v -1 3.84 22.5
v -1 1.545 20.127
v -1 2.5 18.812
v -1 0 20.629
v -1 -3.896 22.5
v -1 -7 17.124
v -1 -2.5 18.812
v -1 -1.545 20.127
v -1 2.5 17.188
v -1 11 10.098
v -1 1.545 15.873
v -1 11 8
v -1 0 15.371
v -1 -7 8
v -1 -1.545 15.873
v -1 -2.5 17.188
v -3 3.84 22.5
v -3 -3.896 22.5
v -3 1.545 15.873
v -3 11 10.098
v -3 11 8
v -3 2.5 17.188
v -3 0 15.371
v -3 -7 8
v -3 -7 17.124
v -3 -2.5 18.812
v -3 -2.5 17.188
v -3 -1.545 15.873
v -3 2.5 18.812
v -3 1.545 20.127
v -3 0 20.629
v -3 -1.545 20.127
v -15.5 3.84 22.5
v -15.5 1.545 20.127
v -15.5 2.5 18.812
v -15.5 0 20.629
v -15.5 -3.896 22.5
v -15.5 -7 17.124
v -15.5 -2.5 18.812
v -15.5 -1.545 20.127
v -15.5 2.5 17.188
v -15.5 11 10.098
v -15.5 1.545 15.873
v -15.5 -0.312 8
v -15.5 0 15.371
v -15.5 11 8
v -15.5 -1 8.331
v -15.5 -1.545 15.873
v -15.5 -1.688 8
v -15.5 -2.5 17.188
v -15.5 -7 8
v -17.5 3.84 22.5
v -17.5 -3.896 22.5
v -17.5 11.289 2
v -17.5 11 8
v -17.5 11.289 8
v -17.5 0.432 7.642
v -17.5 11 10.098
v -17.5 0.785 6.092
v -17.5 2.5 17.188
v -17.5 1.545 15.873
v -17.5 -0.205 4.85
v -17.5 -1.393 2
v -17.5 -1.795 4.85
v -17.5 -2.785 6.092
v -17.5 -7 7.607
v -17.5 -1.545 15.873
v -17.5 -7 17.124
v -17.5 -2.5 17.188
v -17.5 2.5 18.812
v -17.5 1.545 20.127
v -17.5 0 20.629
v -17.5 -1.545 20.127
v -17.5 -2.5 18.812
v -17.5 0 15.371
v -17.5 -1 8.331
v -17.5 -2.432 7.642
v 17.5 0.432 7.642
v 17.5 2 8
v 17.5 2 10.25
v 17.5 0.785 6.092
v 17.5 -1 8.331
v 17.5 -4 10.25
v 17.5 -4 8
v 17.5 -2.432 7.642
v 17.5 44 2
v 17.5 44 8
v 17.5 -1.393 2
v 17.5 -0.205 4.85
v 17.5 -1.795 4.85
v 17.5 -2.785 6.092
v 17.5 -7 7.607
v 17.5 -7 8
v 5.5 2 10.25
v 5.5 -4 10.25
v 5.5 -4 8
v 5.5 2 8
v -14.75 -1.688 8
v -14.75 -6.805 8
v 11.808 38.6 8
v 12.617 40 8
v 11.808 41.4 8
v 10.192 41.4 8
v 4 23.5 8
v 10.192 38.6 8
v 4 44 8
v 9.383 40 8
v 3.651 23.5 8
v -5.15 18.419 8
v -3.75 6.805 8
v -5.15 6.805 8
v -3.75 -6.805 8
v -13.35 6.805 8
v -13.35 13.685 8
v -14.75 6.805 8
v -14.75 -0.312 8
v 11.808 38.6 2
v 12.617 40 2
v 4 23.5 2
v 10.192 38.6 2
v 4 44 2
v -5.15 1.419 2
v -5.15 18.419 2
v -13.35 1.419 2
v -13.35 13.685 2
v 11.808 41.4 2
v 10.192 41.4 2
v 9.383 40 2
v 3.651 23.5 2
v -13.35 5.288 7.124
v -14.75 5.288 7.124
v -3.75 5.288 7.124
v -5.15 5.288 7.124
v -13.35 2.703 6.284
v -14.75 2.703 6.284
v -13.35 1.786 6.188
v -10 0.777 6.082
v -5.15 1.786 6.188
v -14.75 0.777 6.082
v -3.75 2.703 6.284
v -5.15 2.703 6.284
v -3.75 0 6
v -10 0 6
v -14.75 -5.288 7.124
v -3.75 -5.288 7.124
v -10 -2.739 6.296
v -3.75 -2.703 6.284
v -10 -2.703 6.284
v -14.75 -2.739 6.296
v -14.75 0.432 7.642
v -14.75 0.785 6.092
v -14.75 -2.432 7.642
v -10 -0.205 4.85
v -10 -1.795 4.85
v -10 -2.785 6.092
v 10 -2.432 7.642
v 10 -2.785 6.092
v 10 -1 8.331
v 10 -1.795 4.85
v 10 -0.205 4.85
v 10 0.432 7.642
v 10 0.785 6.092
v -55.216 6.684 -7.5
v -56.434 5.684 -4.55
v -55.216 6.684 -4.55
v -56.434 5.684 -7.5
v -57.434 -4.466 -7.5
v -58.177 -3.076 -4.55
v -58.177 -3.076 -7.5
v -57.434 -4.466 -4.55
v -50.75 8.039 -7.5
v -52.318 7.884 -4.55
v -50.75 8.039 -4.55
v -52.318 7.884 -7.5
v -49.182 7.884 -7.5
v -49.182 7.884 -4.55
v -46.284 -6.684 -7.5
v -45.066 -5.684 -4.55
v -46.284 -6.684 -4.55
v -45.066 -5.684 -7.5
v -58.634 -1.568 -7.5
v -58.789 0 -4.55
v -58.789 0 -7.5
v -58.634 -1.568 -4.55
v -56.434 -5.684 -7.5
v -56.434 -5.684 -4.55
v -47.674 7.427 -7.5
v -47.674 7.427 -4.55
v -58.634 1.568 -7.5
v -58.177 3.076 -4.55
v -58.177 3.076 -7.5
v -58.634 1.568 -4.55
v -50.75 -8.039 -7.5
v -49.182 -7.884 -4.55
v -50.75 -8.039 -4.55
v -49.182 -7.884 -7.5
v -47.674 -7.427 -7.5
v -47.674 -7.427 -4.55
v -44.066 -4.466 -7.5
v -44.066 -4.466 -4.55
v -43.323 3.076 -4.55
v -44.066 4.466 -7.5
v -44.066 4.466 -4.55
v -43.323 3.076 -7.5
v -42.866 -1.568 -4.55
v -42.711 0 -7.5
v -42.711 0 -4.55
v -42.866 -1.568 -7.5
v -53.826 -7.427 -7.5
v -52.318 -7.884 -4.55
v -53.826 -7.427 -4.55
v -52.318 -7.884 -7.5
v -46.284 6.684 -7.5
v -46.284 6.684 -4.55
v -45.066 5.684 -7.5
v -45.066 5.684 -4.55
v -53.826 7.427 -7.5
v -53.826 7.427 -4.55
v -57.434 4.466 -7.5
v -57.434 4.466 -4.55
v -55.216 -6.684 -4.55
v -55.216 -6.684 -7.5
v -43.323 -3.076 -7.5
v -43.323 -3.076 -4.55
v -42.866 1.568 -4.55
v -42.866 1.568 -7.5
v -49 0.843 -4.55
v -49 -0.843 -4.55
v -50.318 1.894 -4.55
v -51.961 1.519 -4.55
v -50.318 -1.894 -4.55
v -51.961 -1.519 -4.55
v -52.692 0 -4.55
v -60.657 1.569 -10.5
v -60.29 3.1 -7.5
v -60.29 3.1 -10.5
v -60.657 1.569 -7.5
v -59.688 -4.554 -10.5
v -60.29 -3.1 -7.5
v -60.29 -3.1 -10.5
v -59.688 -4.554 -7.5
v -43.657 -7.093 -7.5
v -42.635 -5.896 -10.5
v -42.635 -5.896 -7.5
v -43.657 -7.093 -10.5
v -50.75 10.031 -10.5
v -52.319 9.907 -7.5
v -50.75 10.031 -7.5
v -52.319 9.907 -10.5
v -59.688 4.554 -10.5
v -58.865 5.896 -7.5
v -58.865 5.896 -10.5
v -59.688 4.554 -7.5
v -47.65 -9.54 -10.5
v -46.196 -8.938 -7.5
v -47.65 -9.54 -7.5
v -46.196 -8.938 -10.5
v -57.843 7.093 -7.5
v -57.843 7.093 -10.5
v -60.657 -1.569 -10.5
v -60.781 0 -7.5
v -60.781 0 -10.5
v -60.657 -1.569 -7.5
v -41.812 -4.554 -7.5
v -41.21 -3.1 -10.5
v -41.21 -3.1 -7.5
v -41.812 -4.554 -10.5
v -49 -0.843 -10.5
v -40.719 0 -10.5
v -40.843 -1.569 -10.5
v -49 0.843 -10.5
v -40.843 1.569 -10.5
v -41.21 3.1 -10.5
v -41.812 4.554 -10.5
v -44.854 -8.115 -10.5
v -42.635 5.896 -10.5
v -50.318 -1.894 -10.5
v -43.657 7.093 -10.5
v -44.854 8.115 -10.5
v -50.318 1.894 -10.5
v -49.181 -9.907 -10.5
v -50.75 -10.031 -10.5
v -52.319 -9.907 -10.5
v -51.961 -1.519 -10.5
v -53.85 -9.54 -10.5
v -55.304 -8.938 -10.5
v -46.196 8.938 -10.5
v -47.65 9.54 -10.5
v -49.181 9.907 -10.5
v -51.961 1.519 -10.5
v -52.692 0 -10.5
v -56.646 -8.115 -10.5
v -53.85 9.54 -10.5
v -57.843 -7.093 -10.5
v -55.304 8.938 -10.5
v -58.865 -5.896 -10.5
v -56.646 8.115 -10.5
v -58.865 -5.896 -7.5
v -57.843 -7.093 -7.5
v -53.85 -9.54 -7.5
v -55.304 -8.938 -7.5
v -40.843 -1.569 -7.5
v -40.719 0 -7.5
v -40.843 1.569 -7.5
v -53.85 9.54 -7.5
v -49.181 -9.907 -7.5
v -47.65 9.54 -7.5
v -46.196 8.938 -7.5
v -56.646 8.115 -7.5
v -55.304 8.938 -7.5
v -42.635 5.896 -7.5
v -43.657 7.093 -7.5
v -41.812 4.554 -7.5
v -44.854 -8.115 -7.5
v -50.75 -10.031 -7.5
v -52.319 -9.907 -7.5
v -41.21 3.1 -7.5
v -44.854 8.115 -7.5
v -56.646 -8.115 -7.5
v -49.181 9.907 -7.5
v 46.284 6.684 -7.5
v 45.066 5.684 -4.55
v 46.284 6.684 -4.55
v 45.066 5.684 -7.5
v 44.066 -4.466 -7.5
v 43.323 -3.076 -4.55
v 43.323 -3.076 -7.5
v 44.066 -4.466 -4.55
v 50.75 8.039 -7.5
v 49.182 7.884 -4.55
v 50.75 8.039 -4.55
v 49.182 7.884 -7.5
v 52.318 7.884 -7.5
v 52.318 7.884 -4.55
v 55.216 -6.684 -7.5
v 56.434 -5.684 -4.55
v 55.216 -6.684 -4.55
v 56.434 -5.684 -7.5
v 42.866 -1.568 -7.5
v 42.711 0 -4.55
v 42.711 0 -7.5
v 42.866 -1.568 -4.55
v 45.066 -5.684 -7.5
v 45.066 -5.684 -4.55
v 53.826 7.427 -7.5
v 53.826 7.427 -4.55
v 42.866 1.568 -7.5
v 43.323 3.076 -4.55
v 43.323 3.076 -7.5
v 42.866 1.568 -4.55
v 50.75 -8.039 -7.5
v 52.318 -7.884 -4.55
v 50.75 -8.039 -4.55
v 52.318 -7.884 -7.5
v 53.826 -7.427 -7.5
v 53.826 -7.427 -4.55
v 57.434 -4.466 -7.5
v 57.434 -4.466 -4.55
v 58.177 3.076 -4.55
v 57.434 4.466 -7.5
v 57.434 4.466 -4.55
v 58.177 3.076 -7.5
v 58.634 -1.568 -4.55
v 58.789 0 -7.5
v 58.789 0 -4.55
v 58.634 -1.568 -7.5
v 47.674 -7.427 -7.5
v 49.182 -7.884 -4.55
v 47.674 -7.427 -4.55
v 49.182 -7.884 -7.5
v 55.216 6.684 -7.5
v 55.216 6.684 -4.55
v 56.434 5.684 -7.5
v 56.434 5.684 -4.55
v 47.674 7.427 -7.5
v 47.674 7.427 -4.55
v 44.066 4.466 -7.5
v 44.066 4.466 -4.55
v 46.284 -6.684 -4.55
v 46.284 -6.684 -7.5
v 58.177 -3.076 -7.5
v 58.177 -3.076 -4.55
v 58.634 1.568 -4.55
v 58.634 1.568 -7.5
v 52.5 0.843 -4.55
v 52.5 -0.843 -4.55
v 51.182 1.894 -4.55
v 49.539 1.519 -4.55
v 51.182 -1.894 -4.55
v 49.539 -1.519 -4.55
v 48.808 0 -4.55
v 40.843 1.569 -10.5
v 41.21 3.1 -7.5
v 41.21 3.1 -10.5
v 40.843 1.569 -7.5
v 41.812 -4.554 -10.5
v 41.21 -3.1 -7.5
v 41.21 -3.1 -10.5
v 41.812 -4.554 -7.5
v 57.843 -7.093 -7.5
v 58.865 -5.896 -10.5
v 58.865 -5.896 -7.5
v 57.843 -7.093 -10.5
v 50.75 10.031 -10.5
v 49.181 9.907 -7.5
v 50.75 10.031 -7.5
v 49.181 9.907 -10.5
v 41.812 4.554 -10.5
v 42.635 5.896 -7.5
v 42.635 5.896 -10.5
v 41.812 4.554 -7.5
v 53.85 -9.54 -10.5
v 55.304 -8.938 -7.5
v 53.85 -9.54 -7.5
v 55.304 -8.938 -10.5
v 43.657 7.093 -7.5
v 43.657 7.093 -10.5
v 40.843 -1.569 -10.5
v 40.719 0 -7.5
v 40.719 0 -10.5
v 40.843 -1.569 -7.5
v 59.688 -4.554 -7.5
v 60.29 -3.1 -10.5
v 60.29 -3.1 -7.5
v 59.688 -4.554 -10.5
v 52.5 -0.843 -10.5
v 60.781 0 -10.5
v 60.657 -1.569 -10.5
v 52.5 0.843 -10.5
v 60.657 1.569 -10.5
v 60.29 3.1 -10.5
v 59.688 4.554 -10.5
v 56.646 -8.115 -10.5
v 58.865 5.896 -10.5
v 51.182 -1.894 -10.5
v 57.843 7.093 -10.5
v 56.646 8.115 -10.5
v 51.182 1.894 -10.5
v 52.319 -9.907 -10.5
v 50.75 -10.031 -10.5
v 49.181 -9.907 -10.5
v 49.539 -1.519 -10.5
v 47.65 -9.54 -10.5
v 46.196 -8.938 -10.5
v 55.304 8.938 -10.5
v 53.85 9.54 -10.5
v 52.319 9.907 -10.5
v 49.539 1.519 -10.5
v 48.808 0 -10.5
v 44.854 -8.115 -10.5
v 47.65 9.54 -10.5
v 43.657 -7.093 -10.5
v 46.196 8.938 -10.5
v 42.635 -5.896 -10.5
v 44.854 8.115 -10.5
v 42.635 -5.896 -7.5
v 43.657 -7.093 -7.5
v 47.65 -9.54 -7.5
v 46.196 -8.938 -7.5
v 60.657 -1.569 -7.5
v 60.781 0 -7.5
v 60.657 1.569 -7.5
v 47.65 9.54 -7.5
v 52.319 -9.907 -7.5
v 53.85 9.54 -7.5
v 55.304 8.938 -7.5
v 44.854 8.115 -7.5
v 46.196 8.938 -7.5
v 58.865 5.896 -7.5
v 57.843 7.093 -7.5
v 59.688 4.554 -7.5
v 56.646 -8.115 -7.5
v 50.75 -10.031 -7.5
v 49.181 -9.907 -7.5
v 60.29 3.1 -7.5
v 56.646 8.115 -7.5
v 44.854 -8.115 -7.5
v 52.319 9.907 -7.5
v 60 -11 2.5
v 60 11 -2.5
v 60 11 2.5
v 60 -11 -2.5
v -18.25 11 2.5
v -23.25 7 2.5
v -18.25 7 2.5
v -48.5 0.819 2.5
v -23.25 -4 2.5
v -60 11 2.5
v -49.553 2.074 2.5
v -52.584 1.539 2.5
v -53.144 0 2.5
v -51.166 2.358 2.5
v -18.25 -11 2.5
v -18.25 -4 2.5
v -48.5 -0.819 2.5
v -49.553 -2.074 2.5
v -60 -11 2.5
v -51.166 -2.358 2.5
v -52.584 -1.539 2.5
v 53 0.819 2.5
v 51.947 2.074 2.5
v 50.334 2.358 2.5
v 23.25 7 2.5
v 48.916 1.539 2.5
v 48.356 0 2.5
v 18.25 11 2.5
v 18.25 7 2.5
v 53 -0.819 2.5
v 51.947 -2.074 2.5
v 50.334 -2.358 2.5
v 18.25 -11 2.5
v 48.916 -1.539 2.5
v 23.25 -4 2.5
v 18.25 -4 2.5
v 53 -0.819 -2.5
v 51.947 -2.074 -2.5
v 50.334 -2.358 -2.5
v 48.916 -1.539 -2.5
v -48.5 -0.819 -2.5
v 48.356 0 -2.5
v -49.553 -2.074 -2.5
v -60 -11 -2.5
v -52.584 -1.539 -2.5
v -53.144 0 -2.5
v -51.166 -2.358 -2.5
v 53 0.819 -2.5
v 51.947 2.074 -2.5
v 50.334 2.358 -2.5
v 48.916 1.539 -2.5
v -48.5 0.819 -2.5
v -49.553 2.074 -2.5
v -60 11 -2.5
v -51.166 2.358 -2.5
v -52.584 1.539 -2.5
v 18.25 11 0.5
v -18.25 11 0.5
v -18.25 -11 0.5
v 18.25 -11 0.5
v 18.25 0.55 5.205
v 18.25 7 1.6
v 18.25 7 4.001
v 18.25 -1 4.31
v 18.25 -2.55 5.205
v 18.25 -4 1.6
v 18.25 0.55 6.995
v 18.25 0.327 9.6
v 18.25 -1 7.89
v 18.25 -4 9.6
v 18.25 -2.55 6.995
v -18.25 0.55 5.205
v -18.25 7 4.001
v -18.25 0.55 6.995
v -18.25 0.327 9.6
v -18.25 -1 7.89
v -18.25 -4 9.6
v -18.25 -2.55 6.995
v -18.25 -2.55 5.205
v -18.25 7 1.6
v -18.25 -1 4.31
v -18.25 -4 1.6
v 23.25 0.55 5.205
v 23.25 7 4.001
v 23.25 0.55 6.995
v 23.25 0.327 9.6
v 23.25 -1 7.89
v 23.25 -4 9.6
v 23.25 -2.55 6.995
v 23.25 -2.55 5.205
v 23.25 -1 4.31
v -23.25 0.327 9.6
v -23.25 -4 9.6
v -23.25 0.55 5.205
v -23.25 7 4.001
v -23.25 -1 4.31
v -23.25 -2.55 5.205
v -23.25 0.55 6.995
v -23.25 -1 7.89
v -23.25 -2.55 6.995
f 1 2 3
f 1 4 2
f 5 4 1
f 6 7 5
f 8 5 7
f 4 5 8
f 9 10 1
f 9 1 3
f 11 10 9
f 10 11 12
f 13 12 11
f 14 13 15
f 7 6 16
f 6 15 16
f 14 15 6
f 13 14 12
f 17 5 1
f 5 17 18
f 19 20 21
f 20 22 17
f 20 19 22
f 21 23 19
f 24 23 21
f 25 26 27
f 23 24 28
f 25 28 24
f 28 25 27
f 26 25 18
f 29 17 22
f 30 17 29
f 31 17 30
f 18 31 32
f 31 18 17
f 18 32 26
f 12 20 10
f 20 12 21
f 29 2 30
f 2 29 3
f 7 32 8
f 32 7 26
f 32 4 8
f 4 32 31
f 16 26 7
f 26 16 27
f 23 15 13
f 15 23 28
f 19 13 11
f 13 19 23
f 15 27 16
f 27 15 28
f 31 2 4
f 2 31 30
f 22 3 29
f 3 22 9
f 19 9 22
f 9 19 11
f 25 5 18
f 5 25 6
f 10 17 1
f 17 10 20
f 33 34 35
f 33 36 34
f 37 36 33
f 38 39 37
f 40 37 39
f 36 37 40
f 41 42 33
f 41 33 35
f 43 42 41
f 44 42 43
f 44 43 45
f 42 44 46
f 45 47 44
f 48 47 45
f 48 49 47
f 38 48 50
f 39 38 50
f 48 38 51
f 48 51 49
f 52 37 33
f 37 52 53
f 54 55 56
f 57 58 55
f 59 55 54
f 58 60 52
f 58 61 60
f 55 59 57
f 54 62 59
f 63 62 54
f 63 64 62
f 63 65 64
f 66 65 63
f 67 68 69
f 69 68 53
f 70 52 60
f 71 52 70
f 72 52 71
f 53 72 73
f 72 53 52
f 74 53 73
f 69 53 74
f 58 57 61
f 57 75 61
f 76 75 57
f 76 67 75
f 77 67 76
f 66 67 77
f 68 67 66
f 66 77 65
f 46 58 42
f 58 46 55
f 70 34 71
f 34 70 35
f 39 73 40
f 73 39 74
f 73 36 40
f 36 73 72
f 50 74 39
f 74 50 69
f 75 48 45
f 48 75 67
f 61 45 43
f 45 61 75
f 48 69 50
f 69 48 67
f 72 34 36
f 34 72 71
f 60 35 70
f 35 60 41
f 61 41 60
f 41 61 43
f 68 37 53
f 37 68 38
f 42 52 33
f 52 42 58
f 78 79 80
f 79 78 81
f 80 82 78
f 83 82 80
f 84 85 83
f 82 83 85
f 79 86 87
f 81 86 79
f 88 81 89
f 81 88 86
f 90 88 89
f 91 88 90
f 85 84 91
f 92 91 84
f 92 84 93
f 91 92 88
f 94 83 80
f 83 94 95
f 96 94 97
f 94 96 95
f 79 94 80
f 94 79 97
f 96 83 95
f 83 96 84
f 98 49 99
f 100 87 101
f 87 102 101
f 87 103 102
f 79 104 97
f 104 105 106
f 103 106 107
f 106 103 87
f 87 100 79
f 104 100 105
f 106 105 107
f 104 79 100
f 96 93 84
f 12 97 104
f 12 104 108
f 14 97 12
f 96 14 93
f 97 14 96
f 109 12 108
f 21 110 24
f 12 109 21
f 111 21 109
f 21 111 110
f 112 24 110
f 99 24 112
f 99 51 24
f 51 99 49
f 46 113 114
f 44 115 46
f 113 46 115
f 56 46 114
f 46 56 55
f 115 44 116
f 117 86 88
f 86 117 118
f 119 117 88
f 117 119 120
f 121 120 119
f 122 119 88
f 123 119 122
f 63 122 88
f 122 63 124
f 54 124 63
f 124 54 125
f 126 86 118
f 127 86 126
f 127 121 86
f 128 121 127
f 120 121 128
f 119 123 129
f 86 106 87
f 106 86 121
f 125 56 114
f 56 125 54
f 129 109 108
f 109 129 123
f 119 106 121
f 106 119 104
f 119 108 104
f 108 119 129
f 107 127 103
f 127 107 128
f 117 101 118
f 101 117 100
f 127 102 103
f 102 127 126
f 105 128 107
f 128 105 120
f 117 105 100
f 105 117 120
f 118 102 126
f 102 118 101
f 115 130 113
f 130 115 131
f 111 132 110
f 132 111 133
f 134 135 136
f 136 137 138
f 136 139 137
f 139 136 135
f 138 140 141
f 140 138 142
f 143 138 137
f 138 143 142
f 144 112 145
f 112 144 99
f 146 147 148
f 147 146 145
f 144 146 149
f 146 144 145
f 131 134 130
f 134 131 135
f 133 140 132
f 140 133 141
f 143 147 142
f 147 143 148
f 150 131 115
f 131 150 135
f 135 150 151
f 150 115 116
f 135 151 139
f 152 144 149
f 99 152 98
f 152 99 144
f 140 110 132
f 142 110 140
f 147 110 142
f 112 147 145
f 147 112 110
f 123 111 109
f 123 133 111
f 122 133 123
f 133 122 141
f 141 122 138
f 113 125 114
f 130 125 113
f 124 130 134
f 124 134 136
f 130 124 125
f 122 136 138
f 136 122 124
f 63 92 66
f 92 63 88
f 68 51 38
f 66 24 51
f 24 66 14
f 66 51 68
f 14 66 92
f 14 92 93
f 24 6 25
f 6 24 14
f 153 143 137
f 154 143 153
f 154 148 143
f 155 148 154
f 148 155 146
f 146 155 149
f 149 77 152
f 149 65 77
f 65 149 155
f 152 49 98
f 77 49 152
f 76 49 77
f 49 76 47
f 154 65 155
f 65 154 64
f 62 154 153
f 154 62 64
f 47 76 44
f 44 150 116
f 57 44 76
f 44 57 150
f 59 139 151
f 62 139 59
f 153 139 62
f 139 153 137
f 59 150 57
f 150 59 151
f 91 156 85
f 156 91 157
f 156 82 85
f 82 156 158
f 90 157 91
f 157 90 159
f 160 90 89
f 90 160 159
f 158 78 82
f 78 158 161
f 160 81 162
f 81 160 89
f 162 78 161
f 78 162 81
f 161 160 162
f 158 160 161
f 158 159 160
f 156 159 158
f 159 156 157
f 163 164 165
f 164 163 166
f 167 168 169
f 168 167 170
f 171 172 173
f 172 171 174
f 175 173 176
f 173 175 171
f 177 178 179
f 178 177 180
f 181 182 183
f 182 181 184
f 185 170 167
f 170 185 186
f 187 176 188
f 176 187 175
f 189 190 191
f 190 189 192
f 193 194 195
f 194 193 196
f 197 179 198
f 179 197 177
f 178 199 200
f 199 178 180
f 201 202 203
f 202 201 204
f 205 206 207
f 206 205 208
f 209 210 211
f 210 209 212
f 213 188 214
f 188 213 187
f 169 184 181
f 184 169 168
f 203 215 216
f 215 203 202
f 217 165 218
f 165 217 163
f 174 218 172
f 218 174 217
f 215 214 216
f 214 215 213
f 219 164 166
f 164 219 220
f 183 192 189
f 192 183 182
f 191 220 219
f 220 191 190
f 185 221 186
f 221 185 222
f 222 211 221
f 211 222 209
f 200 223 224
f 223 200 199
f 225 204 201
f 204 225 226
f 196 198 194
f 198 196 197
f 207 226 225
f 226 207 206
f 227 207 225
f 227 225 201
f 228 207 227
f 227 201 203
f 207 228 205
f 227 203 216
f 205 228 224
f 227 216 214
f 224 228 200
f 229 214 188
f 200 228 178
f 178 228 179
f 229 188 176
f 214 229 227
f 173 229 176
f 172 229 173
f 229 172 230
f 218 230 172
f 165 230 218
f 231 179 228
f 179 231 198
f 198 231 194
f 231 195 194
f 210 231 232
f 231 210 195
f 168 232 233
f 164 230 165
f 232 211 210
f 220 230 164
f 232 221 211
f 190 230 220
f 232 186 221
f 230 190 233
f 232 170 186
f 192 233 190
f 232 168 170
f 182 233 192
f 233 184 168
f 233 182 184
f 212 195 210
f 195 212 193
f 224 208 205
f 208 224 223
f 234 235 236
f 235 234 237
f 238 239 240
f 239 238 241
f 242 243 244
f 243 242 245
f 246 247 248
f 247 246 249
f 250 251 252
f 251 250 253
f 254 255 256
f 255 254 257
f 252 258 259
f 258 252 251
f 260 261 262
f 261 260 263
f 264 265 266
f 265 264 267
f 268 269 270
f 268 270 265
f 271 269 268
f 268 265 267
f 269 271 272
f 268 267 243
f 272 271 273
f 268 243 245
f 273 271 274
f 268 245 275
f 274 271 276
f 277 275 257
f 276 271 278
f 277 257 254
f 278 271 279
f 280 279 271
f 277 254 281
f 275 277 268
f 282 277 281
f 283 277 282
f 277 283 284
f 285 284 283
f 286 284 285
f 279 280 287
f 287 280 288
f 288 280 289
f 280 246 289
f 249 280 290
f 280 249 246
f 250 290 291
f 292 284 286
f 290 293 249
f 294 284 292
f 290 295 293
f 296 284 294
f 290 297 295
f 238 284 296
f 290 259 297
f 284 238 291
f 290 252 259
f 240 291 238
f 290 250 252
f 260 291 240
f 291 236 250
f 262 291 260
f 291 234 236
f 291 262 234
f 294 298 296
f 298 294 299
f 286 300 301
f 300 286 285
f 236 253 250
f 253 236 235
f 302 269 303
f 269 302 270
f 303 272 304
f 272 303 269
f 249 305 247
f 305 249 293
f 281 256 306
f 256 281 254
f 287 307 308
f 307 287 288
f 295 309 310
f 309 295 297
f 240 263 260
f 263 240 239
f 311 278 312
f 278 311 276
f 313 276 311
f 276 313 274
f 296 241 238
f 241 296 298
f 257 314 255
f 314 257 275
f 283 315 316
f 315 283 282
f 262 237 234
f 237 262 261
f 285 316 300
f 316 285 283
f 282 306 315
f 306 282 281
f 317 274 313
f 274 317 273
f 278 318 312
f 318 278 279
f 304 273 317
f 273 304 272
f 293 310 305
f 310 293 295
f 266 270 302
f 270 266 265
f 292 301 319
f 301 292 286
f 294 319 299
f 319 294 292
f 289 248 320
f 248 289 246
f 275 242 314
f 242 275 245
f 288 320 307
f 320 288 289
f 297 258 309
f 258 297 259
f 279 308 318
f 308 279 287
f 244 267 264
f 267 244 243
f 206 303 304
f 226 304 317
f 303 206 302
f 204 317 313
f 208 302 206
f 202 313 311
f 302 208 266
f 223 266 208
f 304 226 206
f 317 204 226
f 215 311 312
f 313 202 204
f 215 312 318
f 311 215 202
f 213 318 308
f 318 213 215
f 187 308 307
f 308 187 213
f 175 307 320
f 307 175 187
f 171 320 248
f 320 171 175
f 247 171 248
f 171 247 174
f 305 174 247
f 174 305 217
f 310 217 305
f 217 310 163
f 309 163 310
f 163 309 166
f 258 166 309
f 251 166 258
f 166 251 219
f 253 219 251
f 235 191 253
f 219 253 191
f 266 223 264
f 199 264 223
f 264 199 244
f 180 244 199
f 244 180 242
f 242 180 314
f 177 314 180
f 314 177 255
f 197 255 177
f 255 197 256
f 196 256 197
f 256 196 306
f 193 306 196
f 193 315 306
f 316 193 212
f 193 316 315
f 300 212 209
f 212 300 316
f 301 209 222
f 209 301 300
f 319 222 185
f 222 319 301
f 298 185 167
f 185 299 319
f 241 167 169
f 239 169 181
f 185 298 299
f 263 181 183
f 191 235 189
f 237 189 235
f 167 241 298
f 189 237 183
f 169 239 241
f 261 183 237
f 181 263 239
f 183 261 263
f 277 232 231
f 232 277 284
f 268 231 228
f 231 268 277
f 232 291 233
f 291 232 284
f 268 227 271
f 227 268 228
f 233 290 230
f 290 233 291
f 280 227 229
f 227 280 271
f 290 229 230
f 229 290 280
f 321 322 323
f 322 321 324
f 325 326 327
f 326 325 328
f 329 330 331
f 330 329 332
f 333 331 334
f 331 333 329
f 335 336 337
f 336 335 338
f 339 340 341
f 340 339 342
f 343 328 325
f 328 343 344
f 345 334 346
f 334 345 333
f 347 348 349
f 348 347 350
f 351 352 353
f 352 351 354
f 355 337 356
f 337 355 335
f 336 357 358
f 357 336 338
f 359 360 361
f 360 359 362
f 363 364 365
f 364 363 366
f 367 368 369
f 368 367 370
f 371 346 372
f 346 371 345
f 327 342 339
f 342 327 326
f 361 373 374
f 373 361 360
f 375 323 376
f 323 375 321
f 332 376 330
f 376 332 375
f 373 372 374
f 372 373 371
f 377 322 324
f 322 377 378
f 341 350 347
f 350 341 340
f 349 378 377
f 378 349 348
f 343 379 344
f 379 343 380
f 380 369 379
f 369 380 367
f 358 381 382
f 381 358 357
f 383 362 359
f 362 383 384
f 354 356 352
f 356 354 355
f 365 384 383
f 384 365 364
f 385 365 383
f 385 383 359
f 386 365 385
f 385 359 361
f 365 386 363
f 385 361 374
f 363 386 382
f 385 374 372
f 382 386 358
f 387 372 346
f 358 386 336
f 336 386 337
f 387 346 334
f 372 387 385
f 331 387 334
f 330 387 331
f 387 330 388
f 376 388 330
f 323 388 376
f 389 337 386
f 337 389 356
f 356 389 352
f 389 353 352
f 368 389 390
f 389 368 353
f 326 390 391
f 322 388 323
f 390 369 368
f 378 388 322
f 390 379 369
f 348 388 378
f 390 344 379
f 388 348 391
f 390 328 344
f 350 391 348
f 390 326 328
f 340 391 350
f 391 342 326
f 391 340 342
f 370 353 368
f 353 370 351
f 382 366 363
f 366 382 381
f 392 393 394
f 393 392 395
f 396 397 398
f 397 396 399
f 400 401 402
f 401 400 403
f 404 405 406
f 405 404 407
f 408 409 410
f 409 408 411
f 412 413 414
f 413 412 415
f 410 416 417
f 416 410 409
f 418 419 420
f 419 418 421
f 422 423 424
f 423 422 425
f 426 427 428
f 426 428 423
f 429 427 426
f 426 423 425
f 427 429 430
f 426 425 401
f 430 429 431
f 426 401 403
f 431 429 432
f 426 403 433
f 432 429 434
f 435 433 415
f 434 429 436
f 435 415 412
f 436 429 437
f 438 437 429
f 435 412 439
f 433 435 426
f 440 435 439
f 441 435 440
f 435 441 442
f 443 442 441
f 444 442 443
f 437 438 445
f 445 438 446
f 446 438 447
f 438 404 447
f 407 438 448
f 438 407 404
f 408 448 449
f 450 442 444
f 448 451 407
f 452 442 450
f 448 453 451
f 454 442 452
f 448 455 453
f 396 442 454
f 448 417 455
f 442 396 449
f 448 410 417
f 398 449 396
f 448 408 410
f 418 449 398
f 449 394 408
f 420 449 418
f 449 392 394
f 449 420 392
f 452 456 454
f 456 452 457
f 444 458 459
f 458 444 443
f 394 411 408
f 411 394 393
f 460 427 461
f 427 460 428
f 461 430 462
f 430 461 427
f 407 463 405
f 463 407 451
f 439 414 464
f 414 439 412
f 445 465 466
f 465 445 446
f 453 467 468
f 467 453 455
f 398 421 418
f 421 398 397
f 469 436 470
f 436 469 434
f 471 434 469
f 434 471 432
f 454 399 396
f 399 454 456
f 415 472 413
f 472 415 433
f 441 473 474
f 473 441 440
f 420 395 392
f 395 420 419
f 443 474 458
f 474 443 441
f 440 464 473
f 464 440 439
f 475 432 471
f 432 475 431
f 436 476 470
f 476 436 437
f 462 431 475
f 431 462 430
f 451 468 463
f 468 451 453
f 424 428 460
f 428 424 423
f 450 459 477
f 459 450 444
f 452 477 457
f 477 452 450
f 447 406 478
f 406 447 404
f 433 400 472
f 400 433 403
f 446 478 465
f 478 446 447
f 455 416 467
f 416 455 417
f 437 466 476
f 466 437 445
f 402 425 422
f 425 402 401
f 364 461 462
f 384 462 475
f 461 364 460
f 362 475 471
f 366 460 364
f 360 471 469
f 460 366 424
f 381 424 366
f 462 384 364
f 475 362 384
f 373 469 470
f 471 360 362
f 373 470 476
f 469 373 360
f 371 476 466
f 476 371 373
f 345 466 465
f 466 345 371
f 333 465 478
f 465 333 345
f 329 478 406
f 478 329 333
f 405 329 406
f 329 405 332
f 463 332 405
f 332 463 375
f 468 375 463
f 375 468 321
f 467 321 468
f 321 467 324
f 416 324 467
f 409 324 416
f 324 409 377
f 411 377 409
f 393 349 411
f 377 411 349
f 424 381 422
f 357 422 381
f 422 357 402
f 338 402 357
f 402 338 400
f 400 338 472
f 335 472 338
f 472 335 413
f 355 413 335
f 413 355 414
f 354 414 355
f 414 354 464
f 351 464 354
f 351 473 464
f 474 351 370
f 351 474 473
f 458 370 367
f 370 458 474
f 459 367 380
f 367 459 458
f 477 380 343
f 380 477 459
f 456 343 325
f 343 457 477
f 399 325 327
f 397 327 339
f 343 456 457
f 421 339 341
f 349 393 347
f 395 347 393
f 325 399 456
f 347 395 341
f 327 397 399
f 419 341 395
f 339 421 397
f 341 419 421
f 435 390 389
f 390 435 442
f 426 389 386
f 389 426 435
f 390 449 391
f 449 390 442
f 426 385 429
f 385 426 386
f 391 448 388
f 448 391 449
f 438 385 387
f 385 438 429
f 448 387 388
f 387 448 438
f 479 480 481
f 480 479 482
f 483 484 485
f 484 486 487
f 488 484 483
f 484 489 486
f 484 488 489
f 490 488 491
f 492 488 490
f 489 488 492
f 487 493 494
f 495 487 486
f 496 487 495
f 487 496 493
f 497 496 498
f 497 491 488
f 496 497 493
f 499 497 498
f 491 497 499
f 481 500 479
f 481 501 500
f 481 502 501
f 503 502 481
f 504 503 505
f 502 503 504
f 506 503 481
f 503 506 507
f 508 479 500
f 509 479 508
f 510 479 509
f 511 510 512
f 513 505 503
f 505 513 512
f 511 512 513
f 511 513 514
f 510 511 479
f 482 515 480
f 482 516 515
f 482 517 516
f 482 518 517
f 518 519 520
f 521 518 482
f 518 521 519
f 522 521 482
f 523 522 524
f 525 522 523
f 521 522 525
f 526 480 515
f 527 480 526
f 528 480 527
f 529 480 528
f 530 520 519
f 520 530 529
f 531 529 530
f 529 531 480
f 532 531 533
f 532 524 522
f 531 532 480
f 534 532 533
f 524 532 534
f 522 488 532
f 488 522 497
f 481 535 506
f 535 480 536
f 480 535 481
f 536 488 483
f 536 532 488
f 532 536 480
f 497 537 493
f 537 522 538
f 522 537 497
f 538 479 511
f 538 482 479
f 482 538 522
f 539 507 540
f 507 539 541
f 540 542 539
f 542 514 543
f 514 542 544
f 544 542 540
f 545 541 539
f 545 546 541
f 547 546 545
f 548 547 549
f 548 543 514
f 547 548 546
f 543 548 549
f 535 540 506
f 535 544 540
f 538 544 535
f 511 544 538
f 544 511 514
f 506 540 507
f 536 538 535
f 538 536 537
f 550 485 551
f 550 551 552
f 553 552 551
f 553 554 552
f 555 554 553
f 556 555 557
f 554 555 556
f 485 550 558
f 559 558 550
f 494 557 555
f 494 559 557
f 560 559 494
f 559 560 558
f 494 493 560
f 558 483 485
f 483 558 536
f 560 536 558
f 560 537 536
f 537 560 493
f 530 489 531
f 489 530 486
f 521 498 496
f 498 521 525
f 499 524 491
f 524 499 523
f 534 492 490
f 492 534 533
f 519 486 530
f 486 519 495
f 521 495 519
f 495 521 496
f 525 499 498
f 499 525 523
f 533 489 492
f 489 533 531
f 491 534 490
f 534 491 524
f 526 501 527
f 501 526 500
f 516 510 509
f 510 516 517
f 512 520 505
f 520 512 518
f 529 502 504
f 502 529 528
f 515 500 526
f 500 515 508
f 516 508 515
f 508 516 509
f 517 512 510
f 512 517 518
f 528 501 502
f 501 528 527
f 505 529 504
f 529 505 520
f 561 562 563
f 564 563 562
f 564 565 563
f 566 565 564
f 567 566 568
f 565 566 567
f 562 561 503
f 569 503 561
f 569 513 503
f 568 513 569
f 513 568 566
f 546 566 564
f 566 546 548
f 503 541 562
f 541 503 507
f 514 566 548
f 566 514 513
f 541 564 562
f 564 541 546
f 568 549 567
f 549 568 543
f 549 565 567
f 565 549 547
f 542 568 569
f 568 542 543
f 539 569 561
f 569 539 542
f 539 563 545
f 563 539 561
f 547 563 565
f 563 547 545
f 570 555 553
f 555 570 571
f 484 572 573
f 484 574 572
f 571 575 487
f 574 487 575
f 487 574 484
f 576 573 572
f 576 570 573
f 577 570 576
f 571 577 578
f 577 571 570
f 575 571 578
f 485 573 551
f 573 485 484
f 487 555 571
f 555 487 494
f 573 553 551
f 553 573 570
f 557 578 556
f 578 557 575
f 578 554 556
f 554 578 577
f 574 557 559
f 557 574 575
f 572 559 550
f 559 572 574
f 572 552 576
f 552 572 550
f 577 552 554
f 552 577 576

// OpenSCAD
//Y-Belt tensioner for a Velleman K8200 / 3Drag 3D Printer
//Designed by: http://www.thingiverse.com/sampeople

//HOW TO PRINT
//Export each part individually (except the washers, both can be done together)
//to an stl file, by commenting out different portions at the end of this file. 
//
//Assemble them on the platter inside your favourite slicer program.
//Slice, print, enjoy (etc).
//

//
//=======================================================================================
//polyhole module by nophead: http://www.thingiverse.com/thing:6118
module polyhole(h, d) {
    n = max(round(2 * d),3);
    rotate([0,0,180])
        cylinder(h = h, r = (d / 2) / cos (180 / n), $fn = n,center=true);
}
//End polyhole
//=======================================================================================
//Pulley Clearance
module pulley(d,h)
{
rotate([0,90,0])cylinder(d=d,h=h,center=true,$fn=30);
}
//End pulley
//=======================================================================================
//The Tensioner
module tensioner()
	{
		module bearing_mounts()
			{
				difference()
					{
						cube([2,22,15],center=true);
						translate([0,0,3])rotate([0,90,0])bore(d=5,h=60);
						translate([0,-14,5])rotate([60,0,0])cube([8,22,15],center=true);
						translate([0,12.5,7.5])rotate([-60,0,0])cube([8,22,15],center=true);
					}
			}
			
			difference()
				{
					union()
						{
							translate([-2,0,15])bearing_mounts();
							translate([-16.5,0,15])bearing_mounts();
							translate([11.5,-1,9])cube([12,6,2.5],center=true);
							translate([0,16.5,5])cube([35,55,6],center=true); //main bit
						} 
					translate([-18,11,0])rotate([0,0,30])cube([25,30,15]); //angled bit
					translate([-21,23.5,0])cube([25,30,15]); //top
					translate([11,40,6.5])bore(d=2.8,h=10); //tension screw
					translate([-9.25,0,19])pulley(d=26,h=11);
					translate([-9.25,12,8.2])rotate([-5,0,0])cube([8.2,20,15],center=true); //belt cutout
					translate([0,-10,0])rotate([-45,0,0])cube([50,20,15],center=true);
					translate([0,-17,15])cube([50,20,15],center=true);
					translate([-15,-1,6.5])rotate([0,90,0])bore(d=3.3,h=10);
					translate([15,-1,6.5])rotate([0,90,0])bore(d=3.3,h=10);
				}	
	}
//End Tensioner
//=======================================================================================
//Washers
module washers()
	{
		difference()
			{
				union()
					{
						translate([0,0,2.9])polyhole(d=16,h=3.1);
						polyhole(d=20,h=3);
					}
				bore(d=3.5,h=10);
			}
	}
//End Washers
//=======================================================================================
//The Base
module base()
	{
		module tens_mounts()
			{
					difference()
						{
							cube([5,11,8],center=true);
							translate([0,5,6])rotate([50,0,0])cube([7,11,11],center=true);
							translate([0,-2.5,0.5])rotate([0,90,0])bore(d=3.1,h=80);
						}
			}
		union()
			{
				difference()
					{
					cube([120,22,5],center=true); //main bit
					translate([0,0,2])cube([36.5,30,3],center=true);
					translate([-50.75,0,0])polyhole(d=4.5,h=10);
					translate([50.75,0,0])polyhole(d=4.5,h=10);
					}
				translate([20.75,1.5,5.6])tens_mounts();
				translate([-20.75,1.5,5.6])tens_mounts();
			}
	}



//End Base
//=======================================================================================
//Bore for cutting holes in stuff
module bore(d,h)
	{
		polyhole(h,d);
	}
//=======================================================================================

//pulley standin do not print this part. used only for design and included if
//position of pully needs to be adjusted later
//translate([-9.4,0,19])pulley(d=20,h=11); //creates a mock pulley to assist in positioning
//
//
//
//The Tensioner
tensioner(); 

//Washers
translate([-50.75,0,-9])washers();
translate([50.75,0,-9])washers();

//Main Base
base();
		
